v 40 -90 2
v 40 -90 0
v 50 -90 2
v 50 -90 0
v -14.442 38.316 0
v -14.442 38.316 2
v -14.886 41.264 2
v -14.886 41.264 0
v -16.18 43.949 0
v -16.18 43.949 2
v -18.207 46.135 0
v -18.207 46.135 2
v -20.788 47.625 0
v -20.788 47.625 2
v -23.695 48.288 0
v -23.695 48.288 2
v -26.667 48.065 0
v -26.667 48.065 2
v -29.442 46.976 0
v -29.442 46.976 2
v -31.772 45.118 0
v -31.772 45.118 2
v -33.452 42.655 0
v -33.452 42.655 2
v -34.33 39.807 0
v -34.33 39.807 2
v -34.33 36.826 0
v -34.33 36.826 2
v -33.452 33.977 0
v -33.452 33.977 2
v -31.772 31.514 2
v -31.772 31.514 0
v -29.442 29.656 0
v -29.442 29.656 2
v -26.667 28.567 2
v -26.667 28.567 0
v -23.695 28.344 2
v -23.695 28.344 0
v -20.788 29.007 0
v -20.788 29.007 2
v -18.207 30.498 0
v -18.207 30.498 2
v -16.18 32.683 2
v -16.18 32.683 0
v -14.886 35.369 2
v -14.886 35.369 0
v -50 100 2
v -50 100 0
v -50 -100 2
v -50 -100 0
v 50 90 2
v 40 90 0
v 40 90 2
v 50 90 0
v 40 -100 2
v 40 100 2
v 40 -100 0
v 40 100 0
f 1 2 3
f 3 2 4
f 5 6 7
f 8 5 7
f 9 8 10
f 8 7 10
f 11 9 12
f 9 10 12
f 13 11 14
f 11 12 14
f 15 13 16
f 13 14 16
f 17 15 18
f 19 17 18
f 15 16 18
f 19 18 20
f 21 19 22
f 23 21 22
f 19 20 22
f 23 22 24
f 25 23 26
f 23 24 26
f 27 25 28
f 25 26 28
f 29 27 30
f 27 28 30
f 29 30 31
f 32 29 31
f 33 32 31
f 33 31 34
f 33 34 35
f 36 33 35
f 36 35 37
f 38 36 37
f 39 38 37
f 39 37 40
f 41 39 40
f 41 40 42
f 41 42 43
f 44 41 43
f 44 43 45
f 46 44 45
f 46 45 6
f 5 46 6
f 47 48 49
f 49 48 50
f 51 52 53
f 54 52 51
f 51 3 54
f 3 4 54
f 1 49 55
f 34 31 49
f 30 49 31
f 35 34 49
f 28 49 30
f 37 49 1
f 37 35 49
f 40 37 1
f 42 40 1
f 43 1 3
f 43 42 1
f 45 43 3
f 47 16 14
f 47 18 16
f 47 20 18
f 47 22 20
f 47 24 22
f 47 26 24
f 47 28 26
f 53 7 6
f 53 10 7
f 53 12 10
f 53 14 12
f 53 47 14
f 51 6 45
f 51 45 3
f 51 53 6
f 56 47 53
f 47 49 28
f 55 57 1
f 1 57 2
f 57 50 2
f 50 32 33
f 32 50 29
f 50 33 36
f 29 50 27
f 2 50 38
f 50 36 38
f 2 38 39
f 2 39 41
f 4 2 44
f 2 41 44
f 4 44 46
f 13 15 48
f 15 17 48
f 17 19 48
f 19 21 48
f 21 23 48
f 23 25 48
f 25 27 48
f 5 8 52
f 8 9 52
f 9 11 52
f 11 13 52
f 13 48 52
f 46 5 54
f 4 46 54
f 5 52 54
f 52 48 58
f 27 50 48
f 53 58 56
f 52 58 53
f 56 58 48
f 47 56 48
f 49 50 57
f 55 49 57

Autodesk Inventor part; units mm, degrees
ref_plane "YZ Plane" through (0, 0, 0) normal (1, 0, 0) x (0, 1, 0)
ref_plane "XZ Plane" through (0, 0, 0) normal (0, 1, 0) x (-1, 0, 0)
ref_plane "XY Plane" through (0, 0, 0) normal (0, 0, 1) x (1, 0, 0)
sketch "Sketch1" plane through (0, 0, 0) normal (0, 0, 1) x (1, 0, 0)
  line L0 (-50, -100) -> (50, -100)
  line L1 (50, -100) -> (50, 100)
  line L2 (50, 100) -> (-50, 100)
  line L3 (-50, 100) -> (-50, -100)
  line L4 (-50, -100) -> (50, 100) construction
  line L5 (50, -100) -> (-50, 100) construction
  line L6 (50, 100) -> (40, 100)
  line L7 (40, 100) -> (40, 90)
  line L8 (40, 90) -> (50, 90)
  line L9 (50, 90) -> (50, 100)
  line L10 (50, -100) -> (40, -100)
  line L11 (40, -100) -> (40, -90)
  line L12 (40, -90) -> (50, -90)
  line L13 (50, -90) -> (50, -100)
  point P0 (0, 0)
  dimension "d154" = 100
  dimension "d155" = 200
  dimension "d158" = 10
  dimension "d159" = 10
extrude "Plate5" add sketch "Sketch1" along normal blind 2 contours L3 L2 L7 L8 L1 L12 L11 L0
sketch "Sketch7" plane through (0, 0, 2) normal (0, 0, 1) x (1, 0, 0)
  circle A0 centre (-24.4419, 38.3162) radius 10
  point P0 (0, 0)
  dimension "d157" = 20
extrude "Cut1" cut sketch "Sketch7" against normal blind 2
sketch "Sketch8" plane through (0, 0, 2) normal (0, 0, 1) x (1, 0, 0)
  line L0 (-39.1312, 91.8227) -> (16.5981, 91.8227) construction
  line L1 (16.5981, 91.8227) -> (16.5981, 81.3689) construction
  line L2 (16.5981, 81.3689) -> (-39.1312, 81.3689) construction
  line L3 (-39.1312, 81.3689) -> (-39.1312, 91.8227) construction
  point P0 (0, 0)
mark "Mark2"
properties material "Stainless Steel"
